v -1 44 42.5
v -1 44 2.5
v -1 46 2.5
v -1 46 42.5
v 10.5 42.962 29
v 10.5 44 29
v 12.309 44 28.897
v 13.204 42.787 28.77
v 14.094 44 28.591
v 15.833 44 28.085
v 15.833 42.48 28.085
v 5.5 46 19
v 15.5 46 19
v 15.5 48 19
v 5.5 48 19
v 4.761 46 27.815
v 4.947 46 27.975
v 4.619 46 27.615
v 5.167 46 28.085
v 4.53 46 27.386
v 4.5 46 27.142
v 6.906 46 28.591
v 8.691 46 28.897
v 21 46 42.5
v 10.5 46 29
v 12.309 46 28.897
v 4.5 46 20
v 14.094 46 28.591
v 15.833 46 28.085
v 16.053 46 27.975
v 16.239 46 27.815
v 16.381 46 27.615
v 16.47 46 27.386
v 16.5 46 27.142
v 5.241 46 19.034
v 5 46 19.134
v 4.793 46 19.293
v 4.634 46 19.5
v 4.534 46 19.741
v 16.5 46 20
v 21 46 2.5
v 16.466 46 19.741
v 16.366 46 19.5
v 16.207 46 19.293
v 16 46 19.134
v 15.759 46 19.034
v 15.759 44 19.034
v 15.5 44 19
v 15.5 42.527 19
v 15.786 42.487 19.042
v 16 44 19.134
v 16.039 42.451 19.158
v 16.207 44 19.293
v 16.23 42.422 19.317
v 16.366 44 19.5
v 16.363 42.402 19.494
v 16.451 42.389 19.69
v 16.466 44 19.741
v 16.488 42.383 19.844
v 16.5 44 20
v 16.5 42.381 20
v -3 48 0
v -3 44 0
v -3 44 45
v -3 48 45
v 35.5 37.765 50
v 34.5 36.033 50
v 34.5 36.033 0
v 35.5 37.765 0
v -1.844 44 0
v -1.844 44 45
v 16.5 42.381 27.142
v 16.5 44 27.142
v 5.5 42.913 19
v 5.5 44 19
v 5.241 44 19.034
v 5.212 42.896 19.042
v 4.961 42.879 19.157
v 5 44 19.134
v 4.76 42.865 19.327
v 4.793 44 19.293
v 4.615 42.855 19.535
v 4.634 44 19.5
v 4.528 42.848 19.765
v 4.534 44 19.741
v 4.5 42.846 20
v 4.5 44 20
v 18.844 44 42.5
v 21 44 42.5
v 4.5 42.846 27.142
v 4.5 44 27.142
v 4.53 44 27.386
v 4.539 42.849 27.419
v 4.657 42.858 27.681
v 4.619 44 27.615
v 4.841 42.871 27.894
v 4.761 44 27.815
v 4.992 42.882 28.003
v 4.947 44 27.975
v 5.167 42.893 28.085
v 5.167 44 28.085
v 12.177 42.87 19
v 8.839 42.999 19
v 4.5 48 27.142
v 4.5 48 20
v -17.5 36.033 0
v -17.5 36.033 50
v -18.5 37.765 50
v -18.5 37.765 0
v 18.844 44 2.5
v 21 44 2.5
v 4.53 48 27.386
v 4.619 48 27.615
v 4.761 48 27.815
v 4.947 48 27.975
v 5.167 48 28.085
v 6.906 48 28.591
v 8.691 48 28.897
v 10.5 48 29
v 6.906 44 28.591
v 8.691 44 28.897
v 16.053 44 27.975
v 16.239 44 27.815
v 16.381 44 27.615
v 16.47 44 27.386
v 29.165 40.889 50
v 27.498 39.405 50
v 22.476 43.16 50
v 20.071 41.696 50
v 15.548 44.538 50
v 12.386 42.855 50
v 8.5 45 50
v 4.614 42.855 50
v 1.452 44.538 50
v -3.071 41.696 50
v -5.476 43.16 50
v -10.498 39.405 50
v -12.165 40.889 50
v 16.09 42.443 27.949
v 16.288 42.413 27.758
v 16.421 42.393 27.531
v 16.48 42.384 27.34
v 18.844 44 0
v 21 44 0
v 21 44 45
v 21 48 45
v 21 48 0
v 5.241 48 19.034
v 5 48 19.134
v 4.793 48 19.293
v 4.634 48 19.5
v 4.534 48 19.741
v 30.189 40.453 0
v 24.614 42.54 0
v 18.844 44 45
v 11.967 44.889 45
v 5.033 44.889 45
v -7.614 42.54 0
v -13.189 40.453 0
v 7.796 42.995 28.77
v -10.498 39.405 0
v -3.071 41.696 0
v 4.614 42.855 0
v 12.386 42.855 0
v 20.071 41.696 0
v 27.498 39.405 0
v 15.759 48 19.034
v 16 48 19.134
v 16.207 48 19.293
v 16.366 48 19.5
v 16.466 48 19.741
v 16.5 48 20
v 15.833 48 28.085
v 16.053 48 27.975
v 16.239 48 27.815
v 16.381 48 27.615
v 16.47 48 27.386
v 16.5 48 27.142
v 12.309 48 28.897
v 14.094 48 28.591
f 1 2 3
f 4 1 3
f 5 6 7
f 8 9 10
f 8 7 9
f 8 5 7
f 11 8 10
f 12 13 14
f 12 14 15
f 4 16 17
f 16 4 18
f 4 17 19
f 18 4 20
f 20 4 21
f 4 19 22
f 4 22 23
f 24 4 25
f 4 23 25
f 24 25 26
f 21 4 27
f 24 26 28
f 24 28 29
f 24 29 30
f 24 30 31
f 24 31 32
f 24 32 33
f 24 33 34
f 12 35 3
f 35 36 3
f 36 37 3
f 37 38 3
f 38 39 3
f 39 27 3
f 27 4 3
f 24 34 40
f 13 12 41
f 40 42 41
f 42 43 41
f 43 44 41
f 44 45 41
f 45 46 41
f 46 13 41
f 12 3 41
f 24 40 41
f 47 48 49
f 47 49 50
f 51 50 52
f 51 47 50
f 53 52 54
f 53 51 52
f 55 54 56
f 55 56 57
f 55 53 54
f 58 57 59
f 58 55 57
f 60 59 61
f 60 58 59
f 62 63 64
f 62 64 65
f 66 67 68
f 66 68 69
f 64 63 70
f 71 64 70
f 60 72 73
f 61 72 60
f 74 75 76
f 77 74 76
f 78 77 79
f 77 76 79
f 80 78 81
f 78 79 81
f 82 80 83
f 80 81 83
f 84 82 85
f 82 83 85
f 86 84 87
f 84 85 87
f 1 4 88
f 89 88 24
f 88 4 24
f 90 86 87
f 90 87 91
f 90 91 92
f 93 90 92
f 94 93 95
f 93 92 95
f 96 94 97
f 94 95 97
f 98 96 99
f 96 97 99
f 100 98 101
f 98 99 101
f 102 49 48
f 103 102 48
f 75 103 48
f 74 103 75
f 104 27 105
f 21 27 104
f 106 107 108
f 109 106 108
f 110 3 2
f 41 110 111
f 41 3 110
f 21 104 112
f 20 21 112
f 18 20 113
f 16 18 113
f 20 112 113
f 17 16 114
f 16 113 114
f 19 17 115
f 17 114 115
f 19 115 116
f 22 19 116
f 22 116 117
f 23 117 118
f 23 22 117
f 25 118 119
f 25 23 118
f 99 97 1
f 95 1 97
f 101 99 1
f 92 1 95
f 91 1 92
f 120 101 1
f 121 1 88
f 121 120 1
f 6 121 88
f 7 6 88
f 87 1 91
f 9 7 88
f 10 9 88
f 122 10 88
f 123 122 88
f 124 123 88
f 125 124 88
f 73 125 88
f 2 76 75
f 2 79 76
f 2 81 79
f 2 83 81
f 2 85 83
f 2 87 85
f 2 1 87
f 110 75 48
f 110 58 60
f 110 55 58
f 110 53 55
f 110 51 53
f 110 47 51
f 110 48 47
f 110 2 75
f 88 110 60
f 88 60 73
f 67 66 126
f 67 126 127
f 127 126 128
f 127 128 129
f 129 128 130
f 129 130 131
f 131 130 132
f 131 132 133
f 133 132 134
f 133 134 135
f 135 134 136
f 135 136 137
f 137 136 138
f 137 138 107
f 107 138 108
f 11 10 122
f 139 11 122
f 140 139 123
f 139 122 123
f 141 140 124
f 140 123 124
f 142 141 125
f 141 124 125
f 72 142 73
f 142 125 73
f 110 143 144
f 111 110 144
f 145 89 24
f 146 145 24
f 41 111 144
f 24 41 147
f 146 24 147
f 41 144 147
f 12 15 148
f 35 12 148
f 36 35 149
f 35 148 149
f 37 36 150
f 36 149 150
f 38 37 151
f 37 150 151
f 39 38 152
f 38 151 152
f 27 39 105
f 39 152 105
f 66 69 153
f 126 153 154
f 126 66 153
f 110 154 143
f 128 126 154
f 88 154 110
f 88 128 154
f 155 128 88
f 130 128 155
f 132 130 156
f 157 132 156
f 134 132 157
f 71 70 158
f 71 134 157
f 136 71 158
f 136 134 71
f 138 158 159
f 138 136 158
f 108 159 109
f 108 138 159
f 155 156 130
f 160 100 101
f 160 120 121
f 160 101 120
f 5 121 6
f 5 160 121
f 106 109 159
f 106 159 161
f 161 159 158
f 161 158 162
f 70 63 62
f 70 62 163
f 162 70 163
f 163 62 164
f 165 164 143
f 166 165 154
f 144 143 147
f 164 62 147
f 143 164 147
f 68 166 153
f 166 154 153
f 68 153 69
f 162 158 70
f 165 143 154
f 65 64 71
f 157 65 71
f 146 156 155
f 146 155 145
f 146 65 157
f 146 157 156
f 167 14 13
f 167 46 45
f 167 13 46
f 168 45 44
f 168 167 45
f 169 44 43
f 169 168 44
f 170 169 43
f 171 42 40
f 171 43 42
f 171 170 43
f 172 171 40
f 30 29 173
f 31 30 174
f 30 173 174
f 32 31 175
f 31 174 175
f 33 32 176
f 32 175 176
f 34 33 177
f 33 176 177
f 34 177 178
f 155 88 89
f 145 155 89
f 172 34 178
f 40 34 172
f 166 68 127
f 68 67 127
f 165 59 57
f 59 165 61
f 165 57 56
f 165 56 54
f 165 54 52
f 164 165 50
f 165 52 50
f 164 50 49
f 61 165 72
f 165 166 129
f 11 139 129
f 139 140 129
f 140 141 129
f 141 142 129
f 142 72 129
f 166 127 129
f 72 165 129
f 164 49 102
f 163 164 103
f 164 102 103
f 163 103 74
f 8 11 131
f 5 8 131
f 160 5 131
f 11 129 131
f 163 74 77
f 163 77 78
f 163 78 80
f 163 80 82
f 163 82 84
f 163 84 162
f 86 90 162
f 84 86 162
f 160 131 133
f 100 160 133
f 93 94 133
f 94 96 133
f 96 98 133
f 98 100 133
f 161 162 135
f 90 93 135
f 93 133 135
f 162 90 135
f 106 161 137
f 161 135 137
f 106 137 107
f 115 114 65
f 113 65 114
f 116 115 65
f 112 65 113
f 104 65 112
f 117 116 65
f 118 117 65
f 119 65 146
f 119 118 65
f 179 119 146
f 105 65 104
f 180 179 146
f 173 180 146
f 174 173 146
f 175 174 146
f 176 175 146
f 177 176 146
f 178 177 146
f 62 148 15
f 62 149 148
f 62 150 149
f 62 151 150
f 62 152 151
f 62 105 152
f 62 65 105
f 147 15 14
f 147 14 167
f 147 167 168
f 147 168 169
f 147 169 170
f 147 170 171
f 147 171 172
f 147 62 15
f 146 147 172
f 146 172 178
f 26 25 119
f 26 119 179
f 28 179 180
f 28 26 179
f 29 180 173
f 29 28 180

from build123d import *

# Parameters (mm, degrees)
BOX002_W                    = 23
BOX002_H                    = 2
BOX002_DEPTH                = 40
EXTRUDE_DEPTH               = 6
EXTRUDE001_DEPTH            = 6
THICKNESS_T                 = 1
BOX001_W                    = 24
BOX001_H                    = 4
BOX001_DEPTH                = 45
CYLINDER001_W               = 52
CYLINDER001_H               = 50
CYLINDER001_ANGLE           = 60
CYLINDER001_PLACEMENT_ANGLE = 60
CYLINDER_W                  = 54
CYLINDER_H                  = 50
CYLINDER_ANGLE              = 60
CYLINDER_PLACEMENT_ANGLE    = 60


with BuildPart() as slot:
    # Box002 → Box002 (new body)
    with BuildSketch(Plane(origin=(-1, 44, 2.5), x_dir=(1, 0, 0), z_dir=(0, 0, 1))):
        with Locations((11.5, 1)):
            Rectangle(BOX002_W, BOX002_H)
    extrude(amount=BOX002_DEPTH)


with BuildPart() as extrude_body:
    # Common_cs001 → Extrude (new body)
    with BuildSketch(Plane(origin=(8.5, 45, 6), x_dir=(1, 0, 0), z_dir=(0, 1, 0))):
        with BuildLine():
            Line((5, 4), (-5, 4))
            Line((-5, 4), (-5, -3.142136))
            ThreePointArc((-5, -3.142136), (-2.53653, -3.783978), (0, -4))
            ThreePointArc((0, -4), (2.53653, -3.783978), (5, -3.142136))
            Line((5, -3.142136), (5, 4))
        make_face()
    extrude(amount=EXTRUDE_DEPTH)


with BuildPart() as extrude001:
    # Common_cs002 → Extrude001 (new body)
    with BuildSketch(Plane(origin=(8.5, 45, 6), x_dir=(1, 0, 0), z_dir=(0, 1, 0))):
        with BuildLine():
            Line((5, 4), (-5, 4))
            Line((-5, 4), (-5, -3.142136))
            ThreePointArc((-5, -3.142136), (-2.53653, -3.783978), (0, -4))
            ThreePointArc((0, -4), (2.53653, -3.783978), (5, -3.142136))
            Line((5, -3.142136), (5, 4))
        make_face()
    extrude(amount=EXTRUDE001_DEPTH)


with BuildPart() as pin_opening:
    # Thickness base: copy of Extrude body
    add(extrude_body.part)

    # Thickness
    thickness_openings = [pin_opening.faces().sort_by_distance(p)[0] for p in [
        (8.5, 51, 5.862901),
    ]]
    offset(amount=THICKNESS_T, openings=thickness_openings)

    # Fusion002: union Extrude body, Extrude001
    add(extrude_body.part)
    add(extrude001.part)


with BuildPart() as pin_opening_1:
    # Fusion002 placement: moved
    add(pin_opening.part.moved(Location((2, -3, 18))))


with BuildPart() as latch:
    # Box001 → Box001 (new body)
    with BuildSketch(Plane(origin=(-3, 44, 0), x_dir=(1, 0, 0), z_dir=(0, 0, 1))):
        with Locations((12, 2)):
            Rectangle(BOX001_W, BOX001_H)
    extrude(amount=BOX001_DEPTH)


with BuildPart() as bottle_wall001:
    # Cylinder001 → Cylinder001 (revolve)
    with BuildSketch(Plane.XZ):
        with Locations((26, 25)):
            Rectangle(CYLINDER001_W, CYLINDER001_H)
    revolve(axis=Axis((0, 0, 0), (0, 0, 1)), revolution_arc=CYLINDER001_ANGLE)


with BuildPart() as bottle_wall001_1:
    # Cylinder001 placement: moved
    add(bottle_wall001.part.moved(Location((8.5, -7, 0))).rotate(Axis((8.5, -7, 0), (0, 0, 1)), CYLINDER001_PLACEMENT_ANGLE))


with BuildPart() as cut004:
    # Cylinder → Cylinder (revolve)
    with BuildSketch(Plane.XZ):
        with Locations((27, 25)):
            Rectangle(CYLINDER_W, CYLINDER_H)
    revolve(axis=Axis((0, 0, 0), (0, 0, 1)), revolution_arc=CYLINDER_ANGLE)


with BuildPart() as cut004_1:
    # Cylinder placement: moved
    add(cut004.part.moved(Location((8.5, -7, 0))).rotate(Axis((8.5, -7, 0), (0, 0, 1)), CYLINDER_PLACEMENT_ANGLE))

    # Cut: cut bottle_wall001
    add(bottle_wall001_1.part, mode=Mode.SUBTRACT)


with BuildPart() as cut004_2:
    # Cut placement: moved
    add(cut004_1.part.moved(Location((0, -2, 0))))

    # Fusion: union latch
    add(latch.part)

    # Fusion001: union latch
    add(latch.part)

    # Cut003: cut pin opening
    add(pin_opening_1.part, mode=Mode.SUBTRACT)

    # Cut004: cut slot
    add(slot.part, mode=Mode.SUBTRACT)


solid = cut004_2.part
